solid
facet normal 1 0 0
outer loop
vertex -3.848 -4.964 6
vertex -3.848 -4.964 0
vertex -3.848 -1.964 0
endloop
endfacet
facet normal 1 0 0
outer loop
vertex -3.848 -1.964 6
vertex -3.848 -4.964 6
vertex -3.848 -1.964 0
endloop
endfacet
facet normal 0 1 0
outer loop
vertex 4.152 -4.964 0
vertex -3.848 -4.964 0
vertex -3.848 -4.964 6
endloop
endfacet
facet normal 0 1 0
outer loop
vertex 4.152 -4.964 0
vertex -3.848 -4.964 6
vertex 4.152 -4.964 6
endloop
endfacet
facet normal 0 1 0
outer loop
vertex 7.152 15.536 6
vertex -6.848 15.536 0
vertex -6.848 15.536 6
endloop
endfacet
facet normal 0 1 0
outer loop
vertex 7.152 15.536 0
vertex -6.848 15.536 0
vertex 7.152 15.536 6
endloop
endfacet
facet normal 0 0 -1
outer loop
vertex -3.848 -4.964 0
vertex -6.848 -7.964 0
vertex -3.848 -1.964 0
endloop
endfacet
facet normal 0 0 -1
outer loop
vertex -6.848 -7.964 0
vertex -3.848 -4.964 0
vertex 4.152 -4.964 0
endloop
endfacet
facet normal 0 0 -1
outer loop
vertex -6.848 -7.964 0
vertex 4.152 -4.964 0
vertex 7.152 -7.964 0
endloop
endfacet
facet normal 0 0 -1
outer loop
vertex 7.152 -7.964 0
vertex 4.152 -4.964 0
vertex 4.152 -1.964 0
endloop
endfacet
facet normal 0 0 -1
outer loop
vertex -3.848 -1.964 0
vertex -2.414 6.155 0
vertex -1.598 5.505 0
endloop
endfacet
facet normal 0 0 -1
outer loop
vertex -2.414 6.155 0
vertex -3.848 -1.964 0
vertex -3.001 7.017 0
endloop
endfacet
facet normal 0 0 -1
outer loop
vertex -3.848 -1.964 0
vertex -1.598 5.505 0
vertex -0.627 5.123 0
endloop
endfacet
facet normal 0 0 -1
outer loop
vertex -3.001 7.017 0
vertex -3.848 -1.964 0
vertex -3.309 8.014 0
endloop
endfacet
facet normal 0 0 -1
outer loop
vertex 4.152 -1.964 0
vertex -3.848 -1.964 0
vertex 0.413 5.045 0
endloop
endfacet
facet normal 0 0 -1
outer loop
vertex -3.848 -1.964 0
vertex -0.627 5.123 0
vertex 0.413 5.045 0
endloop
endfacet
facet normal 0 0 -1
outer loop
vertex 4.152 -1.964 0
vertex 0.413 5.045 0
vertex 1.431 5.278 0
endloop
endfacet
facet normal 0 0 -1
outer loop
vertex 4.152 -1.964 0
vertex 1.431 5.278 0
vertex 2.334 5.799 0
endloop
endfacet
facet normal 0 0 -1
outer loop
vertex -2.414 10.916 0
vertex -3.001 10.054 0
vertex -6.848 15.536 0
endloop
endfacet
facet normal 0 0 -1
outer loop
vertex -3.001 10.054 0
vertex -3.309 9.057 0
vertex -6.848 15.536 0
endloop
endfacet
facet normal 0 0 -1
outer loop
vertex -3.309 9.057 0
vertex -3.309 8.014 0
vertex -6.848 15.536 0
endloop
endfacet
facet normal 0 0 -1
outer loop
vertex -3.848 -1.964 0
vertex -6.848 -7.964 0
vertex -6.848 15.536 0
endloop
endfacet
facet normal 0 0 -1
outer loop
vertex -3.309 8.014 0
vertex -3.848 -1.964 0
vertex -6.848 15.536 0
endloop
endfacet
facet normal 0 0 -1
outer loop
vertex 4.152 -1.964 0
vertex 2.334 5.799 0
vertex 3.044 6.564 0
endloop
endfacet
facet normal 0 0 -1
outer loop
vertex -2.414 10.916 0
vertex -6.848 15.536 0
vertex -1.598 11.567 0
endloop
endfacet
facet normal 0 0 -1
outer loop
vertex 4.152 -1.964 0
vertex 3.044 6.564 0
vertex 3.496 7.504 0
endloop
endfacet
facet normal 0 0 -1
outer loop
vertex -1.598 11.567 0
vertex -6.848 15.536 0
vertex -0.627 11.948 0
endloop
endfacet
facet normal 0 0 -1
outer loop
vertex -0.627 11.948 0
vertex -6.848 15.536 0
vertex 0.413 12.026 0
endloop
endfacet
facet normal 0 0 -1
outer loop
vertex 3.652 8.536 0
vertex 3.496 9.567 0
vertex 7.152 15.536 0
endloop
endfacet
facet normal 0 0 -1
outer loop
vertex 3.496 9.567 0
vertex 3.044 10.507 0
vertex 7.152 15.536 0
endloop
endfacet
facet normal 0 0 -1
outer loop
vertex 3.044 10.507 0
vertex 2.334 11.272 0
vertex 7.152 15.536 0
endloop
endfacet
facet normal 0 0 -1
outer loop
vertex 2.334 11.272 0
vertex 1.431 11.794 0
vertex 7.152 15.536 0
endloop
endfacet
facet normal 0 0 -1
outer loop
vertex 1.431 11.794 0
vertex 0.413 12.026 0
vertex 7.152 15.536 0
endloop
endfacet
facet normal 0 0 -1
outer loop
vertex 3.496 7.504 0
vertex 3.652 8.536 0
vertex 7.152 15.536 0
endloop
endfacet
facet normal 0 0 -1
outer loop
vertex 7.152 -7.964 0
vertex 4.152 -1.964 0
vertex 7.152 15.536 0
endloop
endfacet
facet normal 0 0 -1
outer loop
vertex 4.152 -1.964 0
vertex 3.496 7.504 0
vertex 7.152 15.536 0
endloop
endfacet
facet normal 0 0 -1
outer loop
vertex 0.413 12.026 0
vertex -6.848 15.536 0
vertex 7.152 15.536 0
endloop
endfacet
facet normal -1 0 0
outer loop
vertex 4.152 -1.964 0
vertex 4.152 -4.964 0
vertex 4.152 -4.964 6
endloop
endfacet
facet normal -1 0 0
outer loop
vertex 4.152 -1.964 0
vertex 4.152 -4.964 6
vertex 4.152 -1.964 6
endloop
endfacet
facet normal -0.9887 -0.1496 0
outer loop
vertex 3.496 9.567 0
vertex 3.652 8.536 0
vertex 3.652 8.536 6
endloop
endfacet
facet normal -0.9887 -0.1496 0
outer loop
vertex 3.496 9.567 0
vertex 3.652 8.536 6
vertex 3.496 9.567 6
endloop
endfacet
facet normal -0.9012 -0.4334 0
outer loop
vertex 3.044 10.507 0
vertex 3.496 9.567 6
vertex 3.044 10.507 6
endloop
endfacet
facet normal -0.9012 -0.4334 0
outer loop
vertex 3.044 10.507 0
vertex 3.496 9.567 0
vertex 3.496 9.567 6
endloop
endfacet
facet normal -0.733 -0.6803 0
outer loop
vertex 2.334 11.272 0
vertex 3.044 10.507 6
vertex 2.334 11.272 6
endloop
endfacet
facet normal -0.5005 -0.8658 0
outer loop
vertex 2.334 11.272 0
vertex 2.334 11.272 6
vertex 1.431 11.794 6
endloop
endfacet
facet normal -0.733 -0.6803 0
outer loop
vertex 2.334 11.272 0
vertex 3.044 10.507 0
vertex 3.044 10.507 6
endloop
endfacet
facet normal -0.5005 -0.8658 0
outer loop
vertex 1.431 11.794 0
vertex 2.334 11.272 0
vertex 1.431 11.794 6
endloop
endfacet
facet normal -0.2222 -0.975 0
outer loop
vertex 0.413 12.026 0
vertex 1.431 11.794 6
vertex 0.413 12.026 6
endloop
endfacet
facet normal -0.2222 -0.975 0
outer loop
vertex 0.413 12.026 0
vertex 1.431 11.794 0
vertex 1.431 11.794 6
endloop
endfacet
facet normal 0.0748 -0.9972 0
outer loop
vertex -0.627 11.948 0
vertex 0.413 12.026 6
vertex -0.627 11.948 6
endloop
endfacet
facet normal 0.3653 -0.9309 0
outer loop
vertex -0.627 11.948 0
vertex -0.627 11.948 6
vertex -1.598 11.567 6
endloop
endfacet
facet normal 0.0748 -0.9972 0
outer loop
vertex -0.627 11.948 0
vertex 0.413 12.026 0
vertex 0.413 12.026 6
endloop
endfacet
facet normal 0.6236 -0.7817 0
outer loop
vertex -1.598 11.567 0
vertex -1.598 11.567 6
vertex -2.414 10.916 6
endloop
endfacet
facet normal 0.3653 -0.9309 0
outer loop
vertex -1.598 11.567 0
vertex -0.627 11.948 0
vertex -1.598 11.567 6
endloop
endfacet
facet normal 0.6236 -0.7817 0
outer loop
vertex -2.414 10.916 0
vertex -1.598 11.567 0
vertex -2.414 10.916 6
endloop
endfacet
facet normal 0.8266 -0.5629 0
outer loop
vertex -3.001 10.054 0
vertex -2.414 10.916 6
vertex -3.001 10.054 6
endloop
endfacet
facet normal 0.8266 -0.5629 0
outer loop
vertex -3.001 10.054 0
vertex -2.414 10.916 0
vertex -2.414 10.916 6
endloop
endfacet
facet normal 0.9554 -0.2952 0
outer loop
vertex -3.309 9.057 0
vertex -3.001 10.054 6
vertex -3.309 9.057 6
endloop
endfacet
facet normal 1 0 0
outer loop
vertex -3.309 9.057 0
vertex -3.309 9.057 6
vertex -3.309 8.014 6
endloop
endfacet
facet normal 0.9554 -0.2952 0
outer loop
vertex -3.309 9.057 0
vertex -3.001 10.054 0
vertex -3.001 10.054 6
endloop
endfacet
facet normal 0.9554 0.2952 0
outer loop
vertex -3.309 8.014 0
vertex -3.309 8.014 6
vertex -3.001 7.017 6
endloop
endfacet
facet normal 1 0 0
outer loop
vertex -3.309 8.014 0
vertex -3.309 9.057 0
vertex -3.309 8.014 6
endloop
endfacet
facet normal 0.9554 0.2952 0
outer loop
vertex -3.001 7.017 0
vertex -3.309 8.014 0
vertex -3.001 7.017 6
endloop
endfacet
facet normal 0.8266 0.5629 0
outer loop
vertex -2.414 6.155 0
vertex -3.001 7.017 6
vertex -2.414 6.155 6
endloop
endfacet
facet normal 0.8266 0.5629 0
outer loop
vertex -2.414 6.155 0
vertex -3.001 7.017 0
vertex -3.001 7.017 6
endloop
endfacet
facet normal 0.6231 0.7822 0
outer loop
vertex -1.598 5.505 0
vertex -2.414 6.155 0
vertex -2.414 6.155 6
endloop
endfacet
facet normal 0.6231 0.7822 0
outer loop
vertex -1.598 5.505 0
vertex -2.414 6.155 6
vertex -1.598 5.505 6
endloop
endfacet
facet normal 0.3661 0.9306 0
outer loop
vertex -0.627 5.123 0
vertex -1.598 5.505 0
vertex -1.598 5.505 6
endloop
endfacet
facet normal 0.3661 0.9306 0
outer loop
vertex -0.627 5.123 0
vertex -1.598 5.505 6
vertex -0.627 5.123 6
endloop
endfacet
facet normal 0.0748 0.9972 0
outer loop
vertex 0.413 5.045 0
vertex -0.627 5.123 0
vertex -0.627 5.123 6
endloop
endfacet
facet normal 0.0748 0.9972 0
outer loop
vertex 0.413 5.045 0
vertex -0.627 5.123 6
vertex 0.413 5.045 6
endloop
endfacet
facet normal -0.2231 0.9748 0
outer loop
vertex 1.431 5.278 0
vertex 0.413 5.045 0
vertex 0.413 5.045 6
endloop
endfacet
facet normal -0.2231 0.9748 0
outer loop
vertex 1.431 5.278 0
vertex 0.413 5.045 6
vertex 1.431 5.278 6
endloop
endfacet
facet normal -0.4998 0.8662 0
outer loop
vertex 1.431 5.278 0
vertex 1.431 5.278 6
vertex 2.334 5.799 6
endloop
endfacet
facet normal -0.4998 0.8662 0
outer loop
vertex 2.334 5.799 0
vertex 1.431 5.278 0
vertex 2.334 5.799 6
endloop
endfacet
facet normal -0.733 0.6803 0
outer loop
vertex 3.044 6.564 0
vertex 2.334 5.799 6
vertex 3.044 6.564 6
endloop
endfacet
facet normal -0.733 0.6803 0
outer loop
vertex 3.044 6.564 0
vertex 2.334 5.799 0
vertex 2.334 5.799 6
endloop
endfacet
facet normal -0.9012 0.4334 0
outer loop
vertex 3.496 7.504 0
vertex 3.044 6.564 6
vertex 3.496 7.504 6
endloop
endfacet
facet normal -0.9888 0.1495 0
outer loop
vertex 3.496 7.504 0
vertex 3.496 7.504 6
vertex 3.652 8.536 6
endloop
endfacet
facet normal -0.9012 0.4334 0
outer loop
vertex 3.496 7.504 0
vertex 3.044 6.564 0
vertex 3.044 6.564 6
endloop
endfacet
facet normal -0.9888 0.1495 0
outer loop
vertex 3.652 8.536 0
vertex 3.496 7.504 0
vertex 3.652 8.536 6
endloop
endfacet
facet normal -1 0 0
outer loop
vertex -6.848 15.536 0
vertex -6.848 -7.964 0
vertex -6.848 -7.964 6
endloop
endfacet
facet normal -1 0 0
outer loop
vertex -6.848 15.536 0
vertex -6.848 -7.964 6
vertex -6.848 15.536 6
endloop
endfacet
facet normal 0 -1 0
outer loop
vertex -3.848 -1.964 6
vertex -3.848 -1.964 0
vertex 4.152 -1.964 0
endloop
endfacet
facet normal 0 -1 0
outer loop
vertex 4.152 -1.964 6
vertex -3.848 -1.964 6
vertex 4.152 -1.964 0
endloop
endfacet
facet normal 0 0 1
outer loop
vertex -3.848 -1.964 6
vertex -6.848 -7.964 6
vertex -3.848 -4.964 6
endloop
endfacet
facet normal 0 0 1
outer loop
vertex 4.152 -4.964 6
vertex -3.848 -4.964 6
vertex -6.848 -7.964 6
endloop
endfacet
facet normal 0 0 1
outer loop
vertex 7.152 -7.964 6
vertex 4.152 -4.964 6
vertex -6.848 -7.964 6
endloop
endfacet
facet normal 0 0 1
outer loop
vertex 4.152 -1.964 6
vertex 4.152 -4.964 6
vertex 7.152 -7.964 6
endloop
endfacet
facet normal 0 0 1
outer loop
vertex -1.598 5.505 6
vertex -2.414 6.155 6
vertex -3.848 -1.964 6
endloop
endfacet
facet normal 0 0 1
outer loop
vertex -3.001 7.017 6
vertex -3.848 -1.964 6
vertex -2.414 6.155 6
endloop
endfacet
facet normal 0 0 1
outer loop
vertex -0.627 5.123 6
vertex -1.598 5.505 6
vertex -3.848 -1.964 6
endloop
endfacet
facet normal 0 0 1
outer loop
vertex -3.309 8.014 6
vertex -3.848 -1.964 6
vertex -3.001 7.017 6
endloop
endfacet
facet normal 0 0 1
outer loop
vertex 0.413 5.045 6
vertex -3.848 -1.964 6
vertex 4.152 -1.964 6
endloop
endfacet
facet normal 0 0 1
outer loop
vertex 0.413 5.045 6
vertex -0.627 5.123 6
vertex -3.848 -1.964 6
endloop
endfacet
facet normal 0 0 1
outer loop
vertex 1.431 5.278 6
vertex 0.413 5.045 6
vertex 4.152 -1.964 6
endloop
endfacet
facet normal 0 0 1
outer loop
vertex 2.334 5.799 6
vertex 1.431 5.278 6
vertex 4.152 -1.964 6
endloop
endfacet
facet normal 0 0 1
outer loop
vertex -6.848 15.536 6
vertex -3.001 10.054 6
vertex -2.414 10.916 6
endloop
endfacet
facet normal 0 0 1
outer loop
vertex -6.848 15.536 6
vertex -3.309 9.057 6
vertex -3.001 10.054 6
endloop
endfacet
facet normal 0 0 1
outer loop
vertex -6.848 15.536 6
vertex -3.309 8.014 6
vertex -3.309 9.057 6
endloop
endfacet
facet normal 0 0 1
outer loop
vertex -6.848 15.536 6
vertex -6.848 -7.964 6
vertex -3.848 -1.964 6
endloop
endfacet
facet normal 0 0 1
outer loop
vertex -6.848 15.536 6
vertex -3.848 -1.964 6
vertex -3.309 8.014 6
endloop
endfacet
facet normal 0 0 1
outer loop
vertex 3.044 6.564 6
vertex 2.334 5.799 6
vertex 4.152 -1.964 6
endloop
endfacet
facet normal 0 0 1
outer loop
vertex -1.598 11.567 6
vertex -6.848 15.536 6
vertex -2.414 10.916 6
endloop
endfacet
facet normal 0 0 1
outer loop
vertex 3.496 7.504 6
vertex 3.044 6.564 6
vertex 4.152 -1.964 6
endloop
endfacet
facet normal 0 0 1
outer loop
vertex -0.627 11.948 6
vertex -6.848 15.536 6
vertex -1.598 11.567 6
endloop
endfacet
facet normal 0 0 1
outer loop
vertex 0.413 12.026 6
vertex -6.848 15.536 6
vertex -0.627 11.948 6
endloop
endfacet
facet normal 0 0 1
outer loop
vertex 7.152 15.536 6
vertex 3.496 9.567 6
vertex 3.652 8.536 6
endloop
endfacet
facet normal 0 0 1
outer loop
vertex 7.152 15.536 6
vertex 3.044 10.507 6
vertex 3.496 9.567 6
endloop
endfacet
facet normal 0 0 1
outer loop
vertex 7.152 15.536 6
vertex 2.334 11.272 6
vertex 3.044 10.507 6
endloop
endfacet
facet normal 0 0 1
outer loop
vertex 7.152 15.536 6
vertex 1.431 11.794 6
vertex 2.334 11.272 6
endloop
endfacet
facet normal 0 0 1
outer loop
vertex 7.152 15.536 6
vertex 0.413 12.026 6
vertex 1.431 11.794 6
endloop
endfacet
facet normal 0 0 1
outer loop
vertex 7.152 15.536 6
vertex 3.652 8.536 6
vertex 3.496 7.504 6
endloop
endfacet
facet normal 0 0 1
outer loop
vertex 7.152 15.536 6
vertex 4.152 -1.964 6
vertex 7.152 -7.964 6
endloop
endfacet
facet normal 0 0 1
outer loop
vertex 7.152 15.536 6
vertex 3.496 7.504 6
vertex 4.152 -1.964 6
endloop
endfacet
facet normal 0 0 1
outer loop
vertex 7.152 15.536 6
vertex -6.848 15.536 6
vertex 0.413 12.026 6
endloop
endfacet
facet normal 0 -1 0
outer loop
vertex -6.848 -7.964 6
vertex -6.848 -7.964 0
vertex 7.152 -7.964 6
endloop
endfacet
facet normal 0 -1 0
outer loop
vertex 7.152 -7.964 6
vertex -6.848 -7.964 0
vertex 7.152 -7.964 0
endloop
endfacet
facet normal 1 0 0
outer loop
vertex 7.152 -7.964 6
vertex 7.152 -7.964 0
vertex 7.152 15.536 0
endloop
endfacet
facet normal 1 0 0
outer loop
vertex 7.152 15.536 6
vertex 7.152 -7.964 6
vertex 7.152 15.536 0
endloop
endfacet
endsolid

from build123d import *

# Parameters (mm, degrees)
SKETCH1_W           = 14
SKETCH1_H           = 23.5
SKETCH1_R           = 3.5
SKETCH1_W_2         = 8
SKETCH1_H_2         = 3
BOSS_EXTRUDE2_DEPTH = 6


with BuildPart() as part:
    # Sketch1 → Boss-Extrude2 (new body)
    with BuildSketch(Plane.XY):
        with Locations((0.151915527, 3.785637599)):
            Rectangle(SKETCH1_W, SKETCH1_H)
        with Locations((0.151915527, 8.535637599)):
            Circle(SKETCH1_R, mode=Mode.SUBTRACT)
        with Locations((0.151915527, -3.464362401)):
            Rectangle(SKETCH1_W_2, SKETCH1_H_2, mode=Mode.SUBTRACT)
    extrude(amount=BOSS_EXTRUDE2_DEPTH)


solid = part.part
